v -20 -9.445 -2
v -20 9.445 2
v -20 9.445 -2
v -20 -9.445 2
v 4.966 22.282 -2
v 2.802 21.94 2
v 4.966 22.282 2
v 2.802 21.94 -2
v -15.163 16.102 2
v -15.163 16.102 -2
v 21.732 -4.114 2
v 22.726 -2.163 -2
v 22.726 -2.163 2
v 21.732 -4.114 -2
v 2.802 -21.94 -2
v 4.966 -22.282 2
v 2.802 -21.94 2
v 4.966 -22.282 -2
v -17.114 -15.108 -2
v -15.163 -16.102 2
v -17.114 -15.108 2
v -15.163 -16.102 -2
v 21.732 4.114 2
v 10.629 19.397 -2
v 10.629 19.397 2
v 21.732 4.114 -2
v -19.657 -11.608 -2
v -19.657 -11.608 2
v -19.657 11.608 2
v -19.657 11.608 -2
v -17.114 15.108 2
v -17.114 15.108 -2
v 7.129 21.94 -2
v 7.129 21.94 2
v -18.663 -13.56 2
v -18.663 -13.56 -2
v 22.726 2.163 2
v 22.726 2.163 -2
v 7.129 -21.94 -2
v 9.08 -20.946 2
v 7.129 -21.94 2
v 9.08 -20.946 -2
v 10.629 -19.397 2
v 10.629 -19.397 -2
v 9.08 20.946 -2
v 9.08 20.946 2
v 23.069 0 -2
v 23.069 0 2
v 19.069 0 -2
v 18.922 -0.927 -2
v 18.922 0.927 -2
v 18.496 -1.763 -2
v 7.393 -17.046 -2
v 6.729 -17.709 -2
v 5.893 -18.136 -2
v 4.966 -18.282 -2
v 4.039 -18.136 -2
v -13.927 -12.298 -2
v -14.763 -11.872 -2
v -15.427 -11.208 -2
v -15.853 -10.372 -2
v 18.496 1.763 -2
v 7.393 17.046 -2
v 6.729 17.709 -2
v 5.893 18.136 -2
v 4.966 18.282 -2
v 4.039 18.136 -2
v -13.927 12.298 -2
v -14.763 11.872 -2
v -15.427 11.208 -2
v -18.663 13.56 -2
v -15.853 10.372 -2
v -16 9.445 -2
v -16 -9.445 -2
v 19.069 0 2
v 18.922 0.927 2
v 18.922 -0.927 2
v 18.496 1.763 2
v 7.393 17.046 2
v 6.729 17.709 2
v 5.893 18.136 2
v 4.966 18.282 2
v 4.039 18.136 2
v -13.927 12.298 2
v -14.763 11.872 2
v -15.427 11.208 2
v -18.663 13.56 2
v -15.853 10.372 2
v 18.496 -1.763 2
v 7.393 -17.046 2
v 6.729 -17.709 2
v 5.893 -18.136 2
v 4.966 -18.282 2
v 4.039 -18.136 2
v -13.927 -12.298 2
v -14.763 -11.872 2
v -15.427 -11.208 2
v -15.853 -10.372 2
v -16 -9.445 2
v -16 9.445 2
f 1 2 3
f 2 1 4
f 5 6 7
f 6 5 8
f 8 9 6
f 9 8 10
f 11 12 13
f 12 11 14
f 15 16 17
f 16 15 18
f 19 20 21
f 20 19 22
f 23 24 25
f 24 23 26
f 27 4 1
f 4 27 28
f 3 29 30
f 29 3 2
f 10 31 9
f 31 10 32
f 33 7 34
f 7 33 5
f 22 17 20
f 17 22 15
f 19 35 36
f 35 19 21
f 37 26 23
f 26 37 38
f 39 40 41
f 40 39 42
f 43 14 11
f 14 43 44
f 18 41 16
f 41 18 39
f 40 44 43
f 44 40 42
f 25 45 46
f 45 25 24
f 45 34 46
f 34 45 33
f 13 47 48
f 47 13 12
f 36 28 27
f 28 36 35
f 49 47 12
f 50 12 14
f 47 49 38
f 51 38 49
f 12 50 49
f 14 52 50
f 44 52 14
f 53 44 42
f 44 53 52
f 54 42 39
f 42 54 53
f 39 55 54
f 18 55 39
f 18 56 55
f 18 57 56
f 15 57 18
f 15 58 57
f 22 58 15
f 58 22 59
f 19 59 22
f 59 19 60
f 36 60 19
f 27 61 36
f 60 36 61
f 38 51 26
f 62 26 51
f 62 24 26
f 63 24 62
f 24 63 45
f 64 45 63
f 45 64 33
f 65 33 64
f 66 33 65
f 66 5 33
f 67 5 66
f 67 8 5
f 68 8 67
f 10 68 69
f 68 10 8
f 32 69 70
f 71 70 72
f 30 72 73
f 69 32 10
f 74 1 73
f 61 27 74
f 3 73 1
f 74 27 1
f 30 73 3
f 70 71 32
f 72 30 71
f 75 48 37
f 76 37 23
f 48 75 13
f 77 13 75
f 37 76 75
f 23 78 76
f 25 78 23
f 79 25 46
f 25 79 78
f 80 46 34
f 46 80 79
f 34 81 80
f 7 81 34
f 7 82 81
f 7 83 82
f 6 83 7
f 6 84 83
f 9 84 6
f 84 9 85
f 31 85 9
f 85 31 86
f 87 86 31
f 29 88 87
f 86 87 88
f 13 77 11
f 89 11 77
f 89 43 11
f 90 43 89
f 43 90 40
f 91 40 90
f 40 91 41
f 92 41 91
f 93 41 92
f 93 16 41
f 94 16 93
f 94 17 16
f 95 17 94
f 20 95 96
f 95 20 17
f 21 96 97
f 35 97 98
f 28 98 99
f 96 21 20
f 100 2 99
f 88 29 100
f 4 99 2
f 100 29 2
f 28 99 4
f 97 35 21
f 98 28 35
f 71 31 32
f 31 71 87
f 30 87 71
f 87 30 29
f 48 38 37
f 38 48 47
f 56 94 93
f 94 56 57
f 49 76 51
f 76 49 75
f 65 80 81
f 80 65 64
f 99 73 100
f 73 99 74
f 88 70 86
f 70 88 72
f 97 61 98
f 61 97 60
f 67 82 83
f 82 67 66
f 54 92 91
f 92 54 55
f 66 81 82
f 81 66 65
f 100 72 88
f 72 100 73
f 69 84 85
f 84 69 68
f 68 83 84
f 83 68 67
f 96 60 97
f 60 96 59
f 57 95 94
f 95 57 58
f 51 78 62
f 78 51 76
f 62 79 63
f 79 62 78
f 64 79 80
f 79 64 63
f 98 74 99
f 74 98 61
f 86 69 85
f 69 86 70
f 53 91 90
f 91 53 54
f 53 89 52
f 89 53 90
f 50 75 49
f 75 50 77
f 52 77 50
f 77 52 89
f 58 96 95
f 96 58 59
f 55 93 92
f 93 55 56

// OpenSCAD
/*
*   Configurable Harness Center Ring
*   CudaTox, http://cudatox.ca/l/
*   @cudatox
*
*   Feb 21, 2017
*
*   A procedural strap ring for use in novelty body.
*
*   This software and 3D model(s) are experimental and are provided for educational 
*   purposes only. 
*
*   Use of this software, any of its derivatives, or use of any of the models or 
*   parts provided with or created using this software is done at your own risk. 
*
*   DO NOT use this part for securing loads. DO NOT use this part in applications 
*   that may result in property damage, injury or death. NOT FOR CLIMBING USE.
*   
* 
*   This software and files are licensed under the Creative Commons 
*   Attribution-NonCommercial 3.0 license.
*   
*
*/

belt_width = 26;        //Width of the belt you wish to use
n_sides = 5;            //Number of sides on the ring
thickness = 4;          //Thickness of the plastic on all sides
inside_radius = 3;      //Radius of the inside corners of the ring
$fn = 20;


outside_radius = inside_radius + thickness;

module rounded_polygon(n_sides, radius, side_length, height){
    //Actual side length does not include the outside radius.
    hyp = (side_length/2) / cos(180/n_sides);
    hull()
    for( i = [0 : n_sides] ){
        translate([hyp * cos(360 * i/n_sides), hyp * sin(360 * i/n_sides), 0])
            cylinder(h=height, r = radius, center = true);
    }

}


difference(){
  rounded_polygon(n_sides, outside_radius, belt_width, thickness);
  rounded_polygon(n_sides, inside_radius, belt_width, thickness);
}
